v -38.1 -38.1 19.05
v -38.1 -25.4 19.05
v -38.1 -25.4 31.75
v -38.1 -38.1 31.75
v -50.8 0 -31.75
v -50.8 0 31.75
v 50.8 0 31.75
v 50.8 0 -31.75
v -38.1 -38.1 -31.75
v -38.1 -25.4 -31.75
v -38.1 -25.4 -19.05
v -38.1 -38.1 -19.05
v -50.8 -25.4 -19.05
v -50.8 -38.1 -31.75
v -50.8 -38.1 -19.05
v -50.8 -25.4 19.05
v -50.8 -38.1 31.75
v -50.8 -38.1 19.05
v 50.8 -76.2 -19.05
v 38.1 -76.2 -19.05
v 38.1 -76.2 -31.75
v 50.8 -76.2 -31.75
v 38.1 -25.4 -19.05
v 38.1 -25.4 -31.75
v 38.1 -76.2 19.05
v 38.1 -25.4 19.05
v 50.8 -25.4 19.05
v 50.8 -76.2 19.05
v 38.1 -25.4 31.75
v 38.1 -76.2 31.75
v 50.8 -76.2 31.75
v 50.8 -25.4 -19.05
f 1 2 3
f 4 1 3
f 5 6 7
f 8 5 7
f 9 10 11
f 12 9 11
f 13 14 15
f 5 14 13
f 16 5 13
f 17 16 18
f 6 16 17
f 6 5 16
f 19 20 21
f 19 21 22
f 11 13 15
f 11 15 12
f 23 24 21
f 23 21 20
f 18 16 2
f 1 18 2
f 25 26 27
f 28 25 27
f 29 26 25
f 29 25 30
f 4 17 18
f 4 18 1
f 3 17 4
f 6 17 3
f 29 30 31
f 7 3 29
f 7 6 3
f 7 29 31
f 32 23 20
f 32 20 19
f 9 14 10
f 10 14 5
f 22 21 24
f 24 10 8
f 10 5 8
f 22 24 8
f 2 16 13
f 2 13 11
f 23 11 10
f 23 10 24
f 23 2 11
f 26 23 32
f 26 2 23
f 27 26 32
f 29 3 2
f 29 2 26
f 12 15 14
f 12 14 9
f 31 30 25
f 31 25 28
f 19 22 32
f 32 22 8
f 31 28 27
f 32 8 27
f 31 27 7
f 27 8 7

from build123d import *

# Parameters (mm, degrees)
F0_W     = 101.6
F0_H     = 63.5
F1_DEPTH = 25.4
F2_W     = 12.7
F2_H     = 12.7
F3_DEPTH = 12.7
F4_DEPTH = 50.8


with BuildPart() as f1:
    # F0 (on Front) → F1 (new body)
    with BuildSketch(Plane.XZ):
        Rectangle(F0_W, F0_H)
    extrude(amount=F1_DEPTH)

    # F2 (on face) → F3 (join)
    with BuildSketch(Plane.XZ.offset(25.4)):
        with Locations((-44.45, 25.4)):
            Rectangle(F2_W, F2_H)
        with Locations((-44.45, -25.4)):
            Rectangle(F2_W, F2_H)
    extrude(amount=F3_DEPTH)

    # F2 (on face) → F4 (join)
    with BuildSketch(Plane.XZ.offset(25.4)):
        with Locations((44.45, 25.4)):
            Rectangle(F2_W, F2_H)
        with Locations((44.45, -25.4)):
            Rectangle(F2_W, F2_H)
    extrude(amount=F4_DEPTH)


solid = f1.part
